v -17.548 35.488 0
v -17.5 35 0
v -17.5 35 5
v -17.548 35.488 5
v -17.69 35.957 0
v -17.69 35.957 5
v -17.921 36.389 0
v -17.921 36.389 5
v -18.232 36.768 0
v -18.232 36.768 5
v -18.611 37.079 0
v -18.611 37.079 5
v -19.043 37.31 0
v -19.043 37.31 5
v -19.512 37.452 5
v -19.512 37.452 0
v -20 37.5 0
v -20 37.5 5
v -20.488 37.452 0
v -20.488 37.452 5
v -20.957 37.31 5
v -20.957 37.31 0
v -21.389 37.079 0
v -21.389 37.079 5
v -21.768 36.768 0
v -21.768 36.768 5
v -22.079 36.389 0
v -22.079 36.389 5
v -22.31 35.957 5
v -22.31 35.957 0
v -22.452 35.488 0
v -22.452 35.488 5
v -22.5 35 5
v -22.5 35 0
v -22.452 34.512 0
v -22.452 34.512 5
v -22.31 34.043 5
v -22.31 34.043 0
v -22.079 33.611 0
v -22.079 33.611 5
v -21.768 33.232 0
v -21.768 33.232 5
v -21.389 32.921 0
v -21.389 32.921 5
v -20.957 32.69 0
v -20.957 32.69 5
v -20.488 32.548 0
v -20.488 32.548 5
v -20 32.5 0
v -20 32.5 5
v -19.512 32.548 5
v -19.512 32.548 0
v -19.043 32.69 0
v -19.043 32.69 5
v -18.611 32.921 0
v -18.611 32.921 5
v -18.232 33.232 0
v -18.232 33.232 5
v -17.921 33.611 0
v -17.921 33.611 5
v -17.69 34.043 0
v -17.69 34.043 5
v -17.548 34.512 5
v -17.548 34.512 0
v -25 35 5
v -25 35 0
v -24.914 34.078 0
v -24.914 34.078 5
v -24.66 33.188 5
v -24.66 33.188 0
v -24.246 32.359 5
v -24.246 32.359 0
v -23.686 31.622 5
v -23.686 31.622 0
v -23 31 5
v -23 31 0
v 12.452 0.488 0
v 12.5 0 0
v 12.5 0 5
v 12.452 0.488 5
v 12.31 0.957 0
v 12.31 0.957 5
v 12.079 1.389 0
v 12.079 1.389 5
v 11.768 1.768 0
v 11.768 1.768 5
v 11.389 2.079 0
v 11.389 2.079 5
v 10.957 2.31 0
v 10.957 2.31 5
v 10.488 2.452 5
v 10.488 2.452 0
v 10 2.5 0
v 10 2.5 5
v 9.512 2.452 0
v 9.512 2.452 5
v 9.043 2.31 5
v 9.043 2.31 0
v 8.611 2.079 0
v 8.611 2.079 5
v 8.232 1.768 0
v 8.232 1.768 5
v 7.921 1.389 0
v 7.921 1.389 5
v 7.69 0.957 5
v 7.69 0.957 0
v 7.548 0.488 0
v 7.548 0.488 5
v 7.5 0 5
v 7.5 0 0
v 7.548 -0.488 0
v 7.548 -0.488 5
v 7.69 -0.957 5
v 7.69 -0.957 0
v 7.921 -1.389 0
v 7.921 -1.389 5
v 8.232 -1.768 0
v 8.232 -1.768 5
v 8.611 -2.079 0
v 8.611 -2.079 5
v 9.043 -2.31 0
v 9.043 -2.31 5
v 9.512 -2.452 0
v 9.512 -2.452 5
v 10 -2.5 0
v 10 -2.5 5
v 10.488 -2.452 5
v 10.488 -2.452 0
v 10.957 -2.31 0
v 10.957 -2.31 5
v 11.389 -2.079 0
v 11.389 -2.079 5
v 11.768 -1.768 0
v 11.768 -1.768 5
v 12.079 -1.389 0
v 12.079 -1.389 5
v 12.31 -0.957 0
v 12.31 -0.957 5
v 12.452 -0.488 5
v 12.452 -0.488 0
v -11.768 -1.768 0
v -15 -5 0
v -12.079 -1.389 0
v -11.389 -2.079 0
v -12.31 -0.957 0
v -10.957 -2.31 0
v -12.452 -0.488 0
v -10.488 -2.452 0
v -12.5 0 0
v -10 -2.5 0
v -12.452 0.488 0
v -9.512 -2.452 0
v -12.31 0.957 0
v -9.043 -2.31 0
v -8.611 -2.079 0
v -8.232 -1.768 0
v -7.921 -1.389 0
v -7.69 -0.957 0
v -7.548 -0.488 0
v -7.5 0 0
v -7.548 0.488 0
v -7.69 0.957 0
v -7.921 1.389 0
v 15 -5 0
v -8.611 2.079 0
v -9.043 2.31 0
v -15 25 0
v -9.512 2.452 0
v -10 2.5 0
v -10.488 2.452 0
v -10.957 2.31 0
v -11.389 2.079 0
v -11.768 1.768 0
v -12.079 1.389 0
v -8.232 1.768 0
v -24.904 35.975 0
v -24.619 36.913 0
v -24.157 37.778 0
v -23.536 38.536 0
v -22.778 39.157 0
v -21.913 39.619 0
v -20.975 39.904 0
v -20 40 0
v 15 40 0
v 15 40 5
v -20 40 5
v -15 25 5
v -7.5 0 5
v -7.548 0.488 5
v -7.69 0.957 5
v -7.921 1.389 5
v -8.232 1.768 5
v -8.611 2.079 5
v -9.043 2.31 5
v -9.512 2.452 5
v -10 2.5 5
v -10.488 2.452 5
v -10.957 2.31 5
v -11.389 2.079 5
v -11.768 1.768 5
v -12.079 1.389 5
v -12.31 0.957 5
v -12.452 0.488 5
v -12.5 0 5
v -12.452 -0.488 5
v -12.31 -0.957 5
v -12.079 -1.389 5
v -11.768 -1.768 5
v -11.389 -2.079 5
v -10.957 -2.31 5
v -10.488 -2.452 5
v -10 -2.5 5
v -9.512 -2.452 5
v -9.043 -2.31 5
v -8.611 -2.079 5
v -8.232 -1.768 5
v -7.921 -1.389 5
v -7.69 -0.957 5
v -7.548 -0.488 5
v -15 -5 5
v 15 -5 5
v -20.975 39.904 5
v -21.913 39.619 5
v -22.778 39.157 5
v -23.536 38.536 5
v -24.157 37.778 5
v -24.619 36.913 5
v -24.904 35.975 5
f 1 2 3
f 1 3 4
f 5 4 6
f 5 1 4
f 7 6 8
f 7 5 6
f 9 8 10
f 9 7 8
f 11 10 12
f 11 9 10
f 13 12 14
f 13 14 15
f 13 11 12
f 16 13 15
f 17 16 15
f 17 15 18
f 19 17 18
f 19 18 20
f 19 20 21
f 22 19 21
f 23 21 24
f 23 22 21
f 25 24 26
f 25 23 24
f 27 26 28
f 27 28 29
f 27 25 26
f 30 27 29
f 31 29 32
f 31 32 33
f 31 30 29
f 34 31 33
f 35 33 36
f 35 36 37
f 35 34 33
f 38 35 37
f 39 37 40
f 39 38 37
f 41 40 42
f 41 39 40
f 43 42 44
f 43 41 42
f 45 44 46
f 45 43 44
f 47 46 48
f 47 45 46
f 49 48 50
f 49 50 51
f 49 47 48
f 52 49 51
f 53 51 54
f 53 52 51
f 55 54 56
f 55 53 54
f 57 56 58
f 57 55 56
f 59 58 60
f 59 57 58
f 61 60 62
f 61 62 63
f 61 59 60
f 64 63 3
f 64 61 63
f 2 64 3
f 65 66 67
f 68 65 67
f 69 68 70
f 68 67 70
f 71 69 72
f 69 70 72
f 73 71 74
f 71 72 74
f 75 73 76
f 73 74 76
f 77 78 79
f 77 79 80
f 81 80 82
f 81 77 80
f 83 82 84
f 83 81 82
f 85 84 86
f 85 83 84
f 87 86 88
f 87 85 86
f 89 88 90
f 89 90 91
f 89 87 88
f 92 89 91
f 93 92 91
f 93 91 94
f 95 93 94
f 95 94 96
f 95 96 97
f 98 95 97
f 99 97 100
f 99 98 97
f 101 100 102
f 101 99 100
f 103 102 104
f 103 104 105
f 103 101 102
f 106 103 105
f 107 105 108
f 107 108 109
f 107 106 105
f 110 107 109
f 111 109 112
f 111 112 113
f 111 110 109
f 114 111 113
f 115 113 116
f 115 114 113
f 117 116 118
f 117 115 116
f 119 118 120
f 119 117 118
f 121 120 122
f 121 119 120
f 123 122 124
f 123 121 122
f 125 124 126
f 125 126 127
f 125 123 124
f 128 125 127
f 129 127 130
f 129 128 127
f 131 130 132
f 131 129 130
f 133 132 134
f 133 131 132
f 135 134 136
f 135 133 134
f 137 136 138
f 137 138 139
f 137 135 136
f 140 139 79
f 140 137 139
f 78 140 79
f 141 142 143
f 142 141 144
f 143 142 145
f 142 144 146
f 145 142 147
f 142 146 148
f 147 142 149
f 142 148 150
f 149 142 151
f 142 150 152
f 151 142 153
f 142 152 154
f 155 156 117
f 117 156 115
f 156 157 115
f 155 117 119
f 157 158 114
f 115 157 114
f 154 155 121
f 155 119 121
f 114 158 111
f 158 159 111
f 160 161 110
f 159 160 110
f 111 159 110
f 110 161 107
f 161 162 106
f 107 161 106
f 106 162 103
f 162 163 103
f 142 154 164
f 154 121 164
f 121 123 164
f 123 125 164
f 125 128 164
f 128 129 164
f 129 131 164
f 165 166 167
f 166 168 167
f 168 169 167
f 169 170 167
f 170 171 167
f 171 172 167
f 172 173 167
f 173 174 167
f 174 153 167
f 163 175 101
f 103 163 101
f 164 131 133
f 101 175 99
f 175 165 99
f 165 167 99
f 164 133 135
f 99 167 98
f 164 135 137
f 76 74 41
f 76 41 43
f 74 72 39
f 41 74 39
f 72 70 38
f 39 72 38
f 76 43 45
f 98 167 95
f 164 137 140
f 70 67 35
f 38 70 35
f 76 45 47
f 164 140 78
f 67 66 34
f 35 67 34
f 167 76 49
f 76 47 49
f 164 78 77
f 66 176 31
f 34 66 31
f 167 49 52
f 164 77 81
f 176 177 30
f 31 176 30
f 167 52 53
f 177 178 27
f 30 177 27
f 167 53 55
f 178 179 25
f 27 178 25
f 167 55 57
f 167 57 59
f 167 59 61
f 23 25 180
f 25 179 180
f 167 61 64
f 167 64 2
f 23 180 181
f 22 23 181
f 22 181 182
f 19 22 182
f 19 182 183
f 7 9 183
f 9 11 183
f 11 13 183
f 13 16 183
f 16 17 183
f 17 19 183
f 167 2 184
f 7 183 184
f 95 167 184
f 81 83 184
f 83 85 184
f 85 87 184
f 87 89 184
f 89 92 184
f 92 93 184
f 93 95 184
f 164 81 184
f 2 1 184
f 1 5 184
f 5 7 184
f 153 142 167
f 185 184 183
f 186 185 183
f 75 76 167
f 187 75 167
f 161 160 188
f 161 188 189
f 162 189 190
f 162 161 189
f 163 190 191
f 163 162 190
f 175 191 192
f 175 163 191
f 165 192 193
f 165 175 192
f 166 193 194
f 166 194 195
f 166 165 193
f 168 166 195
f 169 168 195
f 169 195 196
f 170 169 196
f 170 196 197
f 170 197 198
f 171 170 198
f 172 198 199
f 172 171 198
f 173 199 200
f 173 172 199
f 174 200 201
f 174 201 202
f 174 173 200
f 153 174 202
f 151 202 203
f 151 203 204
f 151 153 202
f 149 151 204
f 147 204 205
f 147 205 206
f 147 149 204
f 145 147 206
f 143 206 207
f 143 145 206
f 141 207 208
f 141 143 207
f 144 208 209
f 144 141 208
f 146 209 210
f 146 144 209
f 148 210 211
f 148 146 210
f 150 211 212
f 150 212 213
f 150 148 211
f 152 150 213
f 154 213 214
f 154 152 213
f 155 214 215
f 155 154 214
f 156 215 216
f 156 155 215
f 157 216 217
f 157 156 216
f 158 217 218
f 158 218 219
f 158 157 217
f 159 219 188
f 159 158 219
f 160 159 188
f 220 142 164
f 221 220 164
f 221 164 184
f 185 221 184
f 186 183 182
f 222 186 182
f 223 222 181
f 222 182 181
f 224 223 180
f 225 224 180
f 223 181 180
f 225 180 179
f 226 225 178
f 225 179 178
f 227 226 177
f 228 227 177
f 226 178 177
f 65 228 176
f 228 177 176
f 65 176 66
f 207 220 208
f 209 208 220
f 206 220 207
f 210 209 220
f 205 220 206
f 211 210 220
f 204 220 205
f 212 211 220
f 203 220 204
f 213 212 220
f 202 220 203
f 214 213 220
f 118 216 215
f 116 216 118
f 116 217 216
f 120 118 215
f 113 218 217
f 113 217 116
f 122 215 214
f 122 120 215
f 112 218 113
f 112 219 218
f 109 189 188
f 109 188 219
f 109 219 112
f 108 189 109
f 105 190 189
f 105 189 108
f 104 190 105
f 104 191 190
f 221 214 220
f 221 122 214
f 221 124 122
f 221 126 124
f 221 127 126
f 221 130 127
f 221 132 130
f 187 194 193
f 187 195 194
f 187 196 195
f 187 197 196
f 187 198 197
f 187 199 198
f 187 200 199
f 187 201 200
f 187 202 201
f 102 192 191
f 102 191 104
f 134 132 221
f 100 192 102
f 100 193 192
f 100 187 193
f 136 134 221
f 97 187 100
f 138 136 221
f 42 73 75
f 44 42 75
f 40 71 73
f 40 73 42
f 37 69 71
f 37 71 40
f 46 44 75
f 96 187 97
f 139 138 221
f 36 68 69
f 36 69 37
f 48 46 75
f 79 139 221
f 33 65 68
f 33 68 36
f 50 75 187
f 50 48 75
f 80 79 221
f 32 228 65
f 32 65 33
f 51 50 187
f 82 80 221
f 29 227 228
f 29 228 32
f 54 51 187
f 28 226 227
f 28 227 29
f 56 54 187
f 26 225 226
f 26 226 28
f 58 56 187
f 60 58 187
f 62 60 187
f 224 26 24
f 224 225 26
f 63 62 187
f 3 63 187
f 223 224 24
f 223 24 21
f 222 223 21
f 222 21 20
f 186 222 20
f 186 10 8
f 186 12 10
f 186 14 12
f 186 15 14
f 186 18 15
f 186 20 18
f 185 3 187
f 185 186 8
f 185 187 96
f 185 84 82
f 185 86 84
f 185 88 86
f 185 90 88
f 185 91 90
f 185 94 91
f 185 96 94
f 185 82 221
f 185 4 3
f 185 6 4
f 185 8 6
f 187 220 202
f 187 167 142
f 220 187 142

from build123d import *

# Parameters (mm, degrees)
SKETCH1_R           = 2.5
BOSS_EXTRUDE1_DEPTH = 5


with BuildPart() as part:
    # Sketch1 → Boss-Extrude1 (new body)
    with BuildSketch(Plane.XY):
        with BuildLine():
            Line((-15, -5), (15, -5))
            Line((15, -5), (15, 40))
            Line((15, 40), (-20, 40))
            ThreePointArc((-20, 40), (-23.535533906, 38.535533906), (-25, 35))
            ThreePointArc((-25, 35), (-24.472135955, 32.763932023), (-23, 31))
            Line((-23, 31), (-15, 25))
            Line((-15, 25), (-15, -5))
        make_face()
        with Locations((-10, 0)):
            Circle(SKETCH1_R, mode=Mode.SUBTRACT)
        with Locations((10, 0)):
            Circle(SKETCH1_R, mode=Mode.SUBTRACT)
        with Locations((-20, 35)):
            Circle(SKETCH1_R, mode=Mode.SUBTRACT)
    extrude(amount=BOSS_EXTRUDE1_DEPTH)


solid = part.part
